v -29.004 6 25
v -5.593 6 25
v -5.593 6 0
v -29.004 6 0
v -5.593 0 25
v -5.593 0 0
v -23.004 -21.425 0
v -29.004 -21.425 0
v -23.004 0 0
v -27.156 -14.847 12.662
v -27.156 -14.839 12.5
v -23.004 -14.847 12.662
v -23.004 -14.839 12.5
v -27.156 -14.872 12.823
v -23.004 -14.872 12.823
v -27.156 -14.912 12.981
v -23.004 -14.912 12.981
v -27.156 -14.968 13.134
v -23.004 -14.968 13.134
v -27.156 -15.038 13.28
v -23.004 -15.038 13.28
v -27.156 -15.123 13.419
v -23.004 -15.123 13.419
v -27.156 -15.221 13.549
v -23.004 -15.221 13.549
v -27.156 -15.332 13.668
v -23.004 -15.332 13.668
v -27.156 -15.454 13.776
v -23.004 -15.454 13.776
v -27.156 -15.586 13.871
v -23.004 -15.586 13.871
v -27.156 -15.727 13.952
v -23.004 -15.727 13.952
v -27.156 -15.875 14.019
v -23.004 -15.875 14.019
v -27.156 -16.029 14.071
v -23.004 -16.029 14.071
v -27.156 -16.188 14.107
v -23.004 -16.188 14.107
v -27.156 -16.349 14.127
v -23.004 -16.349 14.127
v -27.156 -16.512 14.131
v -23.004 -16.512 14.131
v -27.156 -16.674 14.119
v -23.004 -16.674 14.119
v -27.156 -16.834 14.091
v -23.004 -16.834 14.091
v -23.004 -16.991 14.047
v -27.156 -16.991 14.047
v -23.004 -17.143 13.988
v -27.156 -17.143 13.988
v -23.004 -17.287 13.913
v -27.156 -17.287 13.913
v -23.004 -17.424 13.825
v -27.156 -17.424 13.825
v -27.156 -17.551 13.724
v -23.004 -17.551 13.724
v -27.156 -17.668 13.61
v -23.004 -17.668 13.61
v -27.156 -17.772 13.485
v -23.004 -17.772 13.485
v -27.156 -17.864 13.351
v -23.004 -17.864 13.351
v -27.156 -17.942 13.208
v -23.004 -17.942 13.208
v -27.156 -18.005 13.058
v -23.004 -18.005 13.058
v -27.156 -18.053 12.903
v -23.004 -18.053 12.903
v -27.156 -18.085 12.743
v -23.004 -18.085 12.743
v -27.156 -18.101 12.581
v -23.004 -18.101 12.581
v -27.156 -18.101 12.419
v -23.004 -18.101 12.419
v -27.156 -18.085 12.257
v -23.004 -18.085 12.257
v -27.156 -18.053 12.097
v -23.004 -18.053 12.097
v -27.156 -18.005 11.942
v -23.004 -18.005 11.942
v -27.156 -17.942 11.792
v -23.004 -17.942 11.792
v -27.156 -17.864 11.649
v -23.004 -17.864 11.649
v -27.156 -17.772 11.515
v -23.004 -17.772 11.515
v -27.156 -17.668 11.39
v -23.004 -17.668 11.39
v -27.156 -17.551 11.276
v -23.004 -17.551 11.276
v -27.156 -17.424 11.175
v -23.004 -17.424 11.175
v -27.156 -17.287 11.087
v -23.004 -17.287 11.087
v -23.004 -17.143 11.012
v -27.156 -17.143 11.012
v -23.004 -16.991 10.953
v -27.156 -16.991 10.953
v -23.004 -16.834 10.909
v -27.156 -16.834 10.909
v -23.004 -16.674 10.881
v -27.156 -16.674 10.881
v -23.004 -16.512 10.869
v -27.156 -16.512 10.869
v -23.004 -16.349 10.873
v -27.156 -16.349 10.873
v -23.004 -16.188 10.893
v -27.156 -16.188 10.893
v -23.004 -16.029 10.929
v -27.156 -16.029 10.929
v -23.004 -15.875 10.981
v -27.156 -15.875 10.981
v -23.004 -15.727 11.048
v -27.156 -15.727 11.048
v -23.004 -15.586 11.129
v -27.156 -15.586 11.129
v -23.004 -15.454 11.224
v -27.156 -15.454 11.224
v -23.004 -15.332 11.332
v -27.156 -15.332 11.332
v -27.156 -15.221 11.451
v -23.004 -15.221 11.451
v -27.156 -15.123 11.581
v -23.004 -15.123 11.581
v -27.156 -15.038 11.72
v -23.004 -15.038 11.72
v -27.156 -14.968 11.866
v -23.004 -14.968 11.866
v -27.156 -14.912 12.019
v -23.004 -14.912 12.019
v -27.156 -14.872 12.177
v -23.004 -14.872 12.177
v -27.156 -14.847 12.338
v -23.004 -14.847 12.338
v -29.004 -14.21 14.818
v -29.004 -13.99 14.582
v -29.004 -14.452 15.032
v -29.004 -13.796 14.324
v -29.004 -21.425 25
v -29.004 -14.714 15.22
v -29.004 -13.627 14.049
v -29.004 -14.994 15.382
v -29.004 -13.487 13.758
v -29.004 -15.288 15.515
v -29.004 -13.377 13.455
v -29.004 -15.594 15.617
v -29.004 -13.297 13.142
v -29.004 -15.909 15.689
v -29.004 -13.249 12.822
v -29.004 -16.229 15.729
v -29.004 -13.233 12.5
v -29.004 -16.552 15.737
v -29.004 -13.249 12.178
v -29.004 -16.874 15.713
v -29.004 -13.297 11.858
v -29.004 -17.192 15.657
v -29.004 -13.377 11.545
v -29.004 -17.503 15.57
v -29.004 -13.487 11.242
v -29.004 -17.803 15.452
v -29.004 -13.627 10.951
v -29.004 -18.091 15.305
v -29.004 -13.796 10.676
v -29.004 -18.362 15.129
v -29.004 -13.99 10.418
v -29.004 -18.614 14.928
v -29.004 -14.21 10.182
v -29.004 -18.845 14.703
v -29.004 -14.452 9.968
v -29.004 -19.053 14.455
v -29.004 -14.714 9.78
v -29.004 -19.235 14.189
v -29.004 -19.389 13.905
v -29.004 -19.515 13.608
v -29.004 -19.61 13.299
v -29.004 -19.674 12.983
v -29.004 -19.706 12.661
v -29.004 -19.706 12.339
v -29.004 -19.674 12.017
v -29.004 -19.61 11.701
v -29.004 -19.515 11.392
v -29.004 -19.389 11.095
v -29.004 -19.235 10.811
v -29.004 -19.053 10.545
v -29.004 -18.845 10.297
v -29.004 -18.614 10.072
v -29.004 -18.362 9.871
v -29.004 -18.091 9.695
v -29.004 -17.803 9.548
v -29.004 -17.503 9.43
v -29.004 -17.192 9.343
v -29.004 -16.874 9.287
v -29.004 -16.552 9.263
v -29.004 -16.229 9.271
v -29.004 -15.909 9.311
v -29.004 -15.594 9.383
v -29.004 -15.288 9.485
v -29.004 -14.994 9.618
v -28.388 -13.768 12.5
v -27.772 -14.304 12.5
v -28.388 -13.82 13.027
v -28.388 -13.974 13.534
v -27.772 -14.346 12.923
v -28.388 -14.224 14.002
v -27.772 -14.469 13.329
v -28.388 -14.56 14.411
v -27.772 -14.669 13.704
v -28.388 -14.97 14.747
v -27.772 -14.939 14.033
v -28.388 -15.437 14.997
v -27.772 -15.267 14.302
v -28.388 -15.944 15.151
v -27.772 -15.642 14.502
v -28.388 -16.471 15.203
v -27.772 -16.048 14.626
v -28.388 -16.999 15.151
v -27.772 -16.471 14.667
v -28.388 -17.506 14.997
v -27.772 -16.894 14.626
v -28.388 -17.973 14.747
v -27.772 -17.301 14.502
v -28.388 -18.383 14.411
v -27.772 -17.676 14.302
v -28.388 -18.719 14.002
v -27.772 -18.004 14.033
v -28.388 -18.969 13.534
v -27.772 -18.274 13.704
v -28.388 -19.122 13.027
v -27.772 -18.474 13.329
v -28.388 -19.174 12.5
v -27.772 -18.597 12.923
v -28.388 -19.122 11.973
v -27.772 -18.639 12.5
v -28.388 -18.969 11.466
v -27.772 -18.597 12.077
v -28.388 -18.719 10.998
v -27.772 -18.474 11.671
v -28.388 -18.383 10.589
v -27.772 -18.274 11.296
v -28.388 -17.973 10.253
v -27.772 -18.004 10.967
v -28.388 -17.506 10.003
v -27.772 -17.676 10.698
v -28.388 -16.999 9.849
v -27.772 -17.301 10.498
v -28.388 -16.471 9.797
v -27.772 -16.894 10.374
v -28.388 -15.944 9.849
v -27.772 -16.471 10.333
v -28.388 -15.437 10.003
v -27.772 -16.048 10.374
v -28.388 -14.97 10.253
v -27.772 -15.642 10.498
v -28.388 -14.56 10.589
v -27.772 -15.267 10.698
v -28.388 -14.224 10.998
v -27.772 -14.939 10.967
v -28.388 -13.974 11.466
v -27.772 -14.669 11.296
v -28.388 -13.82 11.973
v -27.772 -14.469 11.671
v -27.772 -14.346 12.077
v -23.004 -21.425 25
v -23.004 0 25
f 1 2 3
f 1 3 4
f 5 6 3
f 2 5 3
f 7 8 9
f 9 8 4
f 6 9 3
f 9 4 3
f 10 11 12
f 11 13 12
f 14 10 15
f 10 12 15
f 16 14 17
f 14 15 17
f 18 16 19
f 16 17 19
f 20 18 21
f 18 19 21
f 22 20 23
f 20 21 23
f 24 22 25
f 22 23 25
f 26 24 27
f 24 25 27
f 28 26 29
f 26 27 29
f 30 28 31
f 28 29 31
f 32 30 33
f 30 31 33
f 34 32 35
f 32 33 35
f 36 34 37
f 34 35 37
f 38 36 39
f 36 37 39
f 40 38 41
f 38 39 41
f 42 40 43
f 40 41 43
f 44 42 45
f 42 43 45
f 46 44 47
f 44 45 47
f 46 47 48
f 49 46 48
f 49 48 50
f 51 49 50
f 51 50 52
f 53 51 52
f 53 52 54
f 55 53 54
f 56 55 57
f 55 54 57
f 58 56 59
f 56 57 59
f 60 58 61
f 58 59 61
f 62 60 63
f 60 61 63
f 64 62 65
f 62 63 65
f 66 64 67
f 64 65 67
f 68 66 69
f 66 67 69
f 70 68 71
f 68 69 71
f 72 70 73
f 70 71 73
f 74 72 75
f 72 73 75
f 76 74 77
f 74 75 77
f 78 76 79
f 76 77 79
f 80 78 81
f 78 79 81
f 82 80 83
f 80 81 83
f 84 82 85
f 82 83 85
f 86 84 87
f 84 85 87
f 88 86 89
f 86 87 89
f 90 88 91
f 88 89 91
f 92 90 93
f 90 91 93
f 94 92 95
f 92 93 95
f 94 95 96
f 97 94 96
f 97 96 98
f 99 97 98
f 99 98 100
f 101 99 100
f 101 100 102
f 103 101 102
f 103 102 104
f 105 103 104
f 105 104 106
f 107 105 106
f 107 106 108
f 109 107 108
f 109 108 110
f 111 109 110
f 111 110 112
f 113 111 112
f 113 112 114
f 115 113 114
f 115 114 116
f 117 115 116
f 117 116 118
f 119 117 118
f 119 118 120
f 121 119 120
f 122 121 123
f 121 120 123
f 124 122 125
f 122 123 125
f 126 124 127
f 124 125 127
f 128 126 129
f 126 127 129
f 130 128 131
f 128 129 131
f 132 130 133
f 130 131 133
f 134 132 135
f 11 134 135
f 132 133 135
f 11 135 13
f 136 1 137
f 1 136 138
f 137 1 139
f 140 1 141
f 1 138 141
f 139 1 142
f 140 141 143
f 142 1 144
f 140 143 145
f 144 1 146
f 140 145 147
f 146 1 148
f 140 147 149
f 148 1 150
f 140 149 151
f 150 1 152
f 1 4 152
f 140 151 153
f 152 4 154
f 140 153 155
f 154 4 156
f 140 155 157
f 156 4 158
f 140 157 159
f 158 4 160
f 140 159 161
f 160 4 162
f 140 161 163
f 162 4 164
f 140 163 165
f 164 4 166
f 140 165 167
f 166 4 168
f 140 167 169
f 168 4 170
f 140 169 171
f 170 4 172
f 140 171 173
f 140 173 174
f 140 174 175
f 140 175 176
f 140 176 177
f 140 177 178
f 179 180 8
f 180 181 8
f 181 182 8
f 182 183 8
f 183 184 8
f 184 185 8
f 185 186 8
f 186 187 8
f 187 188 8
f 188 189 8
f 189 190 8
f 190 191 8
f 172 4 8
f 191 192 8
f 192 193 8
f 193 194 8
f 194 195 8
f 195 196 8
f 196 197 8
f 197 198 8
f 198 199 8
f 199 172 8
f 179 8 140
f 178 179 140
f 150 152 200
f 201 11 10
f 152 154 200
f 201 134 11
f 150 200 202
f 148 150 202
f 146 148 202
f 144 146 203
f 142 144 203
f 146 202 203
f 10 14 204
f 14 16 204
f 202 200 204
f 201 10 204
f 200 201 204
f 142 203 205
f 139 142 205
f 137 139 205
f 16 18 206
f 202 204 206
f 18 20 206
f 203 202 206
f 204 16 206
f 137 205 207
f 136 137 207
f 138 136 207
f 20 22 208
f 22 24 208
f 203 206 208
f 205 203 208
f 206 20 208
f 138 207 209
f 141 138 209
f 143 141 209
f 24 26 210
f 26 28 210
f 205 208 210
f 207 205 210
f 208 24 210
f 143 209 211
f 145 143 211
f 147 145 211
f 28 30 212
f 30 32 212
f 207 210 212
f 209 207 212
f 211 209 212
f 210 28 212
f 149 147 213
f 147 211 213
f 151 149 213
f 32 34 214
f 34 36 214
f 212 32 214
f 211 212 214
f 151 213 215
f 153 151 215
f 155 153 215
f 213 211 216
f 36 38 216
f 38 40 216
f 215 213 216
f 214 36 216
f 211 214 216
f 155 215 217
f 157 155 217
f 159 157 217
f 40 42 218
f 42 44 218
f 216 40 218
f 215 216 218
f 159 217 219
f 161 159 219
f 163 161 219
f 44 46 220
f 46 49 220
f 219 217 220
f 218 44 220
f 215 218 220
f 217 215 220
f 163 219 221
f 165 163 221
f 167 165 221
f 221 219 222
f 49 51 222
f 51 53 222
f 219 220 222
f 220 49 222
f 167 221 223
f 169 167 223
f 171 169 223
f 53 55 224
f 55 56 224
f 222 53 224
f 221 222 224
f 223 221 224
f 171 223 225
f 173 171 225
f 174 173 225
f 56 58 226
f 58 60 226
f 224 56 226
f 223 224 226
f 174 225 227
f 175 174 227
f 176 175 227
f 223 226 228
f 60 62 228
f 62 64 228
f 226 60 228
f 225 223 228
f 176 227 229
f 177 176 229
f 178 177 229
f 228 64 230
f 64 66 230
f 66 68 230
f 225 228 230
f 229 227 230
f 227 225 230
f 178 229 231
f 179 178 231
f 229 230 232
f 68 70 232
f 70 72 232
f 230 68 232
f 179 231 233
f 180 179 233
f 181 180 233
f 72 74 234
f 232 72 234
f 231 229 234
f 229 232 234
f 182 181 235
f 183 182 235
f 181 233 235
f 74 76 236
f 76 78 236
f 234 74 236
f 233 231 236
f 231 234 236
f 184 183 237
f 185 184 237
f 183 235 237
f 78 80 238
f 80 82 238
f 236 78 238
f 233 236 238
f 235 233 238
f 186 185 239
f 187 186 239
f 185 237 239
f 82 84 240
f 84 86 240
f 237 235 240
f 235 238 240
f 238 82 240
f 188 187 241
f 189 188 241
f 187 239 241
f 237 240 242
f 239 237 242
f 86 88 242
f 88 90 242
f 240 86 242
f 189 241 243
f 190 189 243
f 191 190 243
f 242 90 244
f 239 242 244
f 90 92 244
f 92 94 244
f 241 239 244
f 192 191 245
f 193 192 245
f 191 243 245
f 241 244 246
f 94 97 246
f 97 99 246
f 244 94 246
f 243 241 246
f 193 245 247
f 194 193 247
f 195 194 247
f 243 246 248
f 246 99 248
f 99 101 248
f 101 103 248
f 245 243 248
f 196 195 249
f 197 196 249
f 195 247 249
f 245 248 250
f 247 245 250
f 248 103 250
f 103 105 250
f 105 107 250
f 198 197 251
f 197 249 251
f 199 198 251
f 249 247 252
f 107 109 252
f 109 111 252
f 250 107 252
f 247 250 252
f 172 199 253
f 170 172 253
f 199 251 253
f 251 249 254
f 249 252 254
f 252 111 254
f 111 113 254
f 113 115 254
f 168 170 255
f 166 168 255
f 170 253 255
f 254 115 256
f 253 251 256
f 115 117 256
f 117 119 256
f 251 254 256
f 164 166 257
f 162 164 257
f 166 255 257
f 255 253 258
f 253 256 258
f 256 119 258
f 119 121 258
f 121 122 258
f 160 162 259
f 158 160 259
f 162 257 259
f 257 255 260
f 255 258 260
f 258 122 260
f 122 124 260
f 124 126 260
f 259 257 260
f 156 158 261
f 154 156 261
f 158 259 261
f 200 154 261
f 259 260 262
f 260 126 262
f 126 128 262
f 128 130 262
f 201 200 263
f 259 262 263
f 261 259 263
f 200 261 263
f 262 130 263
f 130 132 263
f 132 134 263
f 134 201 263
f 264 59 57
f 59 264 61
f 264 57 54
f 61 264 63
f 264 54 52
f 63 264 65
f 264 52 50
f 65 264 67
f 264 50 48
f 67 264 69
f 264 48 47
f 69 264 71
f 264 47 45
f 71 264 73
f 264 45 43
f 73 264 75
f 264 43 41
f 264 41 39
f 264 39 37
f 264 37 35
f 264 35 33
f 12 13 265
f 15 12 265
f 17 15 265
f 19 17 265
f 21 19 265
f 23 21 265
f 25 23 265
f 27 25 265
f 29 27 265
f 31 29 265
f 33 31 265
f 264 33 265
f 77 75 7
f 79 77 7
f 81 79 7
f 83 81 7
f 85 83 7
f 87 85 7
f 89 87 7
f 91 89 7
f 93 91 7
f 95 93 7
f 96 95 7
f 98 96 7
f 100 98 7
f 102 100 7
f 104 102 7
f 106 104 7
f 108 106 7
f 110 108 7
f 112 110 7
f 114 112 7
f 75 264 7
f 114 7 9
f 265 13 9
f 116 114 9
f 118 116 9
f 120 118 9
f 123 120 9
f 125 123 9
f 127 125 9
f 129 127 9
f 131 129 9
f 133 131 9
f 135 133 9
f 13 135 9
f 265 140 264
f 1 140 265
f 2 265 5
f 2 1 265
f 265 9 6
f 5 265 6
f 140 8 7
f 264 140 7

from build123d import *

# Parameters (mm, degrees)
F1_DEPTH       = 25
F3_D           = 3.2639
F3_CSINK_D     = 6.477
F3_CSINK_ANGLE = 82


with BuildPart() as f1:
    # F0 (on Top) → F1 (new body)
    with BuildSketch(Plane.XY):
        Polygon((-29.003669071, 6), (-29.003669071, -21.425), (-23.003669071, -21.425), (-23.003669071, 0), (-5.5934852733, 0), (-5.5934852733, 6), align=None)
    extrude(amount=F1_DEPTH)

    # F3 (through all)
    with Locations(Plane(origin=(-29.003669071, 0, 0), x_dir=(0, -1, 0), z_dir=(-1, 0, 0))):
        with Locations((16.4713294148, 12.5)):
            CounterSinkHole(F3_D / 2, F3_CSINK_D / 2, counter_sink_angle=F3_CSINK_ANGLE)


solid = f1.part
